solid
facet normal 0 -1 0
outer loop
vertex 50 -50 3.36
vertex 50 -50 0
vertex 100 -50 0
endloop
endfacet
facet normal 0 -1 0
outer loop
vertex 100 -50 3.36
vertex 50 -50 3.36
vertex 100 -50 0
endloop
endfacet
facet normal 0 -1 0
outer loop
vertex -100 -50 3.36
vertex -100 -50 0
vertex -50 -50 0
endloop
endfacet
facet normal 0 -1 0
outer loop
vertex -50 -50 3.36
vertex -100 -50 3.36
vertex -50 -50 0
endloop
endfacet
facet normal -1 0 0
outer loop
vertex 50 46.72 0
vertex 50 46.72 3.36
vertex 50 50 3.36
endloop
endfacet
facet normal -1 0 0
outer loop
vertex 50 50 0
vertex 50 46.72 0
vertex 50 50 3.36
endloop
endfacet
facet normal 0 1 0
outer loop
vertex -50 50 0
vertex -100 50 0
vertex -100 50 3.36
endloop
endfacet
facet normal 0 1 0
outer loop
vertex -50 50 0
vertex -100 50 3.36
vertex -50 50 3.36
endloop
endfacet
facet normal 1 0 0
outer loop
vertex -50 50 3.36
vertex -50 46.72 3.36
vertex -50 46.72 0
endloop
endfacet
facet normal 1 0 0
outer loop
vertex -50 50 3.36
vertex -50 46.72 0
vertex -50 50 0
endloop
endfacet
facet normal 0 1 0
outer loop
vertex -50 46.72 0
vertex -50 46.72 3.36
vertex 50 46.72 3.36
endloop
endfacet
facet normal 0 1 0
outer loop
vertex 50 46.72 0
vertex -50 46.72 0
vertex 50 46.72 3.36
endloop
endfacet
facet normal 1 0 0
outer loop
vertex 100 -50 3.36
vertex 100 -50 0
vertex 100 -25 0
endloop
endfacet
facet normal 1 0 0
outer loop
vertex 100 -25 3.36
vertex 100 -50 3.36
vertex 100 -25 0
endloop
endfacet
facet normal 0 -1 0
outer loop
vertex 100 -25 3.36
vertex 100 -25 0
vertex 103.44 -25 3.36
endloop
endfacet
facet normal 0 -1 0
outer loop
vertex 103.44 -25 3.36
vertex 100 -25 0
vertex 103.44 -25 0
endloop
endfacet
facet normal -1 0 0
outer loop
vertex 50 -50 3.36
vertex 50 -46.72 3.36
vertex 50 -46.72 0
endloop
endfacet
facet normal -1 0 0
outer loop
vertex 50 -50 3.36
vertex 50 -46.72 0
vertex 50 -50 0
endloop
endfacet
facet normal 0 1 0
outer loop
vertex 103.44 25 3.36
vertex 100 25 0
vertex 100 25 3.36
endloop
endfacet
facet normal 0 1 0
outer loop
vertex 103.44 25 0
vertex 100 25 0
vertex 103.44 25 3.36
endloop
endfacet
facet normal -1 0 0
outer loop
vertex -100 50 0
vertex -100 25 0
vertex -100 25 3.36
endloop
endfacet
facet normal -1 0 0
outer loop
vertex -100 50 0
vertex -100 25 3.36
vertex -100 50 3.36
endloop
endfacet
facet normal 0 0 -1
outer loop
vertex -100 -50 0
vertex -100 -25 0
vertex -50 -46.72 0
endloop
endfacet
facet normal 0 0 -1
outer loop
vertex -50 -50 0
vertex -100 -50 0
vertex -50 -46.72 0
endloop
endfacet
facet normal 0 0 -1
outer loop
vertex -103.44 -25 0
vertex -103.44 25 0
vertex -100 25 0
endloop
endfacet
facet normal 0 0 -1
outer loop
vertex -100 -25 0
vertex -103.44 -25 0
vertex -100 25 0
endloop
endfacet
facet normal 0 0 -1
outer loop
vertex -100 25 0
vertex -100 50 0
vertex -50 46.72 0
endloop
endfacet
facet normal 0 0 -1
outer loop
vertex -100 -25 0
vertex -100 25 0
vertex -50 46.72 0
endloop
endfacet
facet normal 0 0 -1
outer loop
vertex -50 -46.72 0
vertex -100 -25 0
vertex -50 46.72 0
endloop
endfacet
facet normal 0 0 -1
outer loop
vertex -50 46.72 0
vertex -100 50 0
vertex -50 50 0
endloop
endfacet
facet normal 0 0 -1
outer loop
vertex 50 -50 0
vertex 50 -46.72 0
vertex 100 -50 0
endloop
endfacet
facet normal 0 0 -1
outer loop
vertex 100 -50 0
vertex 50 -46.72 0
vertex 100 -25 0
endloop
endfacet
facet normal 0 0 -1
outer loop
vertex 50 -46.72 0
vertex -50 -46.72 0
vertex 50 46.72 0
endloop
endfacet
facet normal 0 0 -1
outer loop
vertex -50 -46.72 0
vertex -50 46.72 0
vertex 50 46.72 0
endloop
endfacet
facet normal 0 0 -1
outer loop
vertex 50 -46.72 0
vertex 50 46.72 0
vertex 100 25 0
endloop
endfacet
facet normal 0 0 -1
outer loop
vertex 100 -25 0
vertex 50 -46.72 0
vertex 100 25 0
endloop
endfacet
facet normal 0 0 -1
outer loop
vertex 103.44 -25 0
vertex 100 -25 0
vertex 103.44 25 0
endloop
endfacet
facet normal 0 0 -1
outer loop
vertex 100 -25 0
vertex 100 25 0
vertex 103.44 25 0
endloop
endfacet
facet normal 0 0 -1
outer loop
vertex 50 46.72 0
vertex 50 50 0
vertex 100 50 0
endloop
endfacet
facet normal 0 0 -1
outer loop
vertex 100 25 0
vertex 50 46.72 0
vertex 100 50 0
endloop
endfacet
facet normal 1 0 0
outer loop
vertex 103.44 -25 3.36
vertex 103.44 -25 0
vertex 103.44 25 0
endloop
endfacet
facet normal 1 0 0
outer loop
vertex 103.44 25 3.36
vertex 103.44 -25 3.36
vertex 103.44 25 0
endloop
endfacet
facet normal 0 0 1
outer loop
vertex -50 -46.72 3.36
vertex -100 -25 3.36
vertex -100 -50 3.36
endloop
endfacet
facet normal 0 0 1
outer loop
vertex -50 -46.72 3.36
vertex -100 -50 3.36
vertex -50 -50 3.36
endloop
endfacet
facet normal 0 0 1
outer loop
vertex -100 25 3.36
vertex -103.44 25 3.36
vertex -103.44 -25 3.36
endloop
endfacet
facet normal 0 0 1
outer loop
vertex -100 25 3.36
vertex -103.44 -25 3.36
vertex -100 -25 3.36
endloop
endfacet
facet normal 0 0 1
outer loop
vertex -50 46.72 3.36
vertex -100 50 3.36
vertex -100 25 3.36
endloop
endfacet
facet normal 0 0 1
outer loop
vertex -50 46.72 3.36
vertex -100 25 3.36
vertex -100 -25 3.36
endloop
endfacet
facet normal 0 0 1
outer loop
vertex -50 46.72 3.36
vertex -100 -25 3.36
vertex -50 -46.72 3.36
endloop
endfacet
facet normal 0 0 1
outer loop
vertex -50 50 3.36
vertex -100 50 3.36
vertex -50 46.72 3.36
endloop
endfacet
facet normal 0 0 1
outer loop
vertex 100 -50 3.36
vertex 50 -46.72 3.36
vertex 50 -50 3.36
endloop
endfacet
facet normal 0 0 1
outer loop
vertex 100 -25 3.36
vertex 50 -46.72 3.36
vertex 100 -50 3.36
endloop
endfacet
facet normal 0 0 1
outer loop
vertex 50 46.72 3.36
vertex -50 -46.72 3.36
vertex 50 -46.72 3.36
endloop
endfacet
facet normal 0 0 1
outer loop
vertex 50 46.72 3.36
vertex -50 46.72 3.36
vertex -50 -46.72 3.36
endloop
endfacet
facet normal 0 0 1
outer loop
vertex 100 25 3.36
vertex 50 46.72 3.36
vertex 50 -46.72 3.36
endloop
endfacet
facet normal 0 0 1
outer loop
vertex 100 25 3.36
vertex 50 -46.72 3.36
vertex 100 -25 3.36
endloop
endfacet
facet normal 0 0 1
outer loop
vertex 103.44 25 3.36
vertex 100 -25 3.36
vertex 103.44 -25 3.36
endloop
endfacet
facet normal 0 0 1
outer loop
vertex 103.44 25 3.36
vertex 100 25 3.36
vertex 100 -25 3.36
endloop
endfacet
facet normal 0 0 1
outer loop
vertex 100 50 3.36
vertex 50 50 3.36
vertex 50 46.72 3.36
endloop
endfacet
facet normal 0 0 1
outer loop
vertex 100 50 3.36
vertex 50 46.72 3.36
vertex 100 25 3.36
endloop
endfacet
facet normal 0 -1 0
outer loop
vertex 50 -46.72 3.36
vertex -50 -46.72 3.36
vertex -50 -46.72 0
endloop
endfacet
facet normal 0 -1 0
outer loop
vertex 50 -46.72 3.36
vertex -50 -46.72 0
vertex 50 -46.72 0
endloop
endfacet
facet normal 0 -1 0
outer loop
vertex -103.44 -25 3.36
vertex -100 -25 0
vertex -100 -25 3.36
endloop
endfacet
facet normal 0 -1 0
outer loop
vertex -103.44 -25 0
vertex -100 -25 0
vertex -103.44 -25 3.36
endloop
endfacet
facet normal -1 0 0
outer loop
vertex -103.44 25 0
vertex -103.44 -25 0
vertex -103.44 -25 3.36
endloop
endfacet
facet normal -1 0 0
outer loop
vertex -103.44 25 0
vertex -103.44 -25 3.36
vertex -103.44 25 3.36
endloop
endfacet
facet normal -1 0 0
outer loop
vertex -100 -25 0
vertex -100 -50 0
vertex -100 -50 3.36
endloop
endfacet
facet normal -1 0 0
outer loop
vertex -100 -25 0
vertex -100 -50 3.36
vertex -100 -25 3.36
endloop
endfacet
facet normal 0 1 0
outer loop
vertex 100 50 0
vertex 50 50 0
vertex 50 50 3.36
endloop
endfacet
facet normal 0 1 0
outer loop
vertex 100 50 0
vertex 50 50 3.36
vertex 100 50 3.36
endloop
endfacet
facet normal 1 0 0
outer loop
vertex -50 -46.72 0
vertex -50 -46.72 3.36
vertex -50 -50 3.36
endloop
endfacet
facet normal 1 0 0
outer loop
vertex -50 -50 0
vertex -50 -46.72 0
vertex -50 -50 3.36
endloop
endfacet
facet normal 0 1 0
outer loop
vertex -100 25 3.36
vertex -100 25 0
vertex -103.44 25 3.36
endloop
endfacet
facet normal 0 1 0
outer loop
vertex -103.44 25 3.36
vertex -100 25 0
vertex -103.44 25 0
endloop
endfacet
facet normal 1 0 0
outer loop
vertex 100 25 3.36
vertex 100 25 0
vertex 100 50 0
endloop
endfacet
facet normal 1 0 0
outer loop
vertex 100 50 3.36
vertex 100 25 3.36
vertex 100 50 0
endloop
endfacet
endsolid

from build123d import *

# Parameters (mm, degrees)
SKETCH1_W           = 200
SKETCH1_H           = 100
BOSS_EXTRUDE1_DEPTH = 3.36
SKETCH9_W           = 3.44
SKETCH9_H           = 50
BOSS_EXTRUDE5_DEPTH = 3.36
SKETCH10_W          = 100
SKETCH10_H          = 3.28
CUT_EXTRUDE1_DEPTH  = 3.36


with BuildPart() as part:
    # Sketch1 → Boss-Extrude1 (new body)
    with BuildSketch(Plane.XY):
        Rectangle(SKETCH1_W, SKETCH1_H)
    extrude(amount=BOSS_EXTRUDE1_DEPTH)

    # Sketch9 → Boss-Extrude5 (add)
    with BuildSketch(Plane(origin=(0, 0, 0), x_dir=(-1, 0, 0), z_dir=(0, 0, -1))):
        with Locations((101.72, 0)):
            Rectangle(SKETCH9_W, SKETCH9_H)
    boss_extrude5 = extrude(amount=-BOSS_EXTRUDE5_DEPTH)

    # Mirror5: Boss-Extrude5 across plane
    add(boss_extrude5.mirror(Plane(origin=(0, 0, 0), x_dir=(0, 0, 1), z_dir=(1, 0, 0))))

    # Sketch10 → Cut-Extrude1 (cut)
    with BuildSketch(Plane.XY.offset(3.36)):
        with Locations((0, 48.36)):
            Rectangle(SKETCH10_W, SKETCH10_H)
    cut_extrude1 = extrude(amount=-CUT_EXTRUDE1_DEPTH, mode=Mode.SUBTRACT)

    # Mirror6: Cut-Extrude1 across plane
    add(cut_extrude1.mirror(Plane.ZX), mode=Mode.SUBTRACT)


solid = part.part
